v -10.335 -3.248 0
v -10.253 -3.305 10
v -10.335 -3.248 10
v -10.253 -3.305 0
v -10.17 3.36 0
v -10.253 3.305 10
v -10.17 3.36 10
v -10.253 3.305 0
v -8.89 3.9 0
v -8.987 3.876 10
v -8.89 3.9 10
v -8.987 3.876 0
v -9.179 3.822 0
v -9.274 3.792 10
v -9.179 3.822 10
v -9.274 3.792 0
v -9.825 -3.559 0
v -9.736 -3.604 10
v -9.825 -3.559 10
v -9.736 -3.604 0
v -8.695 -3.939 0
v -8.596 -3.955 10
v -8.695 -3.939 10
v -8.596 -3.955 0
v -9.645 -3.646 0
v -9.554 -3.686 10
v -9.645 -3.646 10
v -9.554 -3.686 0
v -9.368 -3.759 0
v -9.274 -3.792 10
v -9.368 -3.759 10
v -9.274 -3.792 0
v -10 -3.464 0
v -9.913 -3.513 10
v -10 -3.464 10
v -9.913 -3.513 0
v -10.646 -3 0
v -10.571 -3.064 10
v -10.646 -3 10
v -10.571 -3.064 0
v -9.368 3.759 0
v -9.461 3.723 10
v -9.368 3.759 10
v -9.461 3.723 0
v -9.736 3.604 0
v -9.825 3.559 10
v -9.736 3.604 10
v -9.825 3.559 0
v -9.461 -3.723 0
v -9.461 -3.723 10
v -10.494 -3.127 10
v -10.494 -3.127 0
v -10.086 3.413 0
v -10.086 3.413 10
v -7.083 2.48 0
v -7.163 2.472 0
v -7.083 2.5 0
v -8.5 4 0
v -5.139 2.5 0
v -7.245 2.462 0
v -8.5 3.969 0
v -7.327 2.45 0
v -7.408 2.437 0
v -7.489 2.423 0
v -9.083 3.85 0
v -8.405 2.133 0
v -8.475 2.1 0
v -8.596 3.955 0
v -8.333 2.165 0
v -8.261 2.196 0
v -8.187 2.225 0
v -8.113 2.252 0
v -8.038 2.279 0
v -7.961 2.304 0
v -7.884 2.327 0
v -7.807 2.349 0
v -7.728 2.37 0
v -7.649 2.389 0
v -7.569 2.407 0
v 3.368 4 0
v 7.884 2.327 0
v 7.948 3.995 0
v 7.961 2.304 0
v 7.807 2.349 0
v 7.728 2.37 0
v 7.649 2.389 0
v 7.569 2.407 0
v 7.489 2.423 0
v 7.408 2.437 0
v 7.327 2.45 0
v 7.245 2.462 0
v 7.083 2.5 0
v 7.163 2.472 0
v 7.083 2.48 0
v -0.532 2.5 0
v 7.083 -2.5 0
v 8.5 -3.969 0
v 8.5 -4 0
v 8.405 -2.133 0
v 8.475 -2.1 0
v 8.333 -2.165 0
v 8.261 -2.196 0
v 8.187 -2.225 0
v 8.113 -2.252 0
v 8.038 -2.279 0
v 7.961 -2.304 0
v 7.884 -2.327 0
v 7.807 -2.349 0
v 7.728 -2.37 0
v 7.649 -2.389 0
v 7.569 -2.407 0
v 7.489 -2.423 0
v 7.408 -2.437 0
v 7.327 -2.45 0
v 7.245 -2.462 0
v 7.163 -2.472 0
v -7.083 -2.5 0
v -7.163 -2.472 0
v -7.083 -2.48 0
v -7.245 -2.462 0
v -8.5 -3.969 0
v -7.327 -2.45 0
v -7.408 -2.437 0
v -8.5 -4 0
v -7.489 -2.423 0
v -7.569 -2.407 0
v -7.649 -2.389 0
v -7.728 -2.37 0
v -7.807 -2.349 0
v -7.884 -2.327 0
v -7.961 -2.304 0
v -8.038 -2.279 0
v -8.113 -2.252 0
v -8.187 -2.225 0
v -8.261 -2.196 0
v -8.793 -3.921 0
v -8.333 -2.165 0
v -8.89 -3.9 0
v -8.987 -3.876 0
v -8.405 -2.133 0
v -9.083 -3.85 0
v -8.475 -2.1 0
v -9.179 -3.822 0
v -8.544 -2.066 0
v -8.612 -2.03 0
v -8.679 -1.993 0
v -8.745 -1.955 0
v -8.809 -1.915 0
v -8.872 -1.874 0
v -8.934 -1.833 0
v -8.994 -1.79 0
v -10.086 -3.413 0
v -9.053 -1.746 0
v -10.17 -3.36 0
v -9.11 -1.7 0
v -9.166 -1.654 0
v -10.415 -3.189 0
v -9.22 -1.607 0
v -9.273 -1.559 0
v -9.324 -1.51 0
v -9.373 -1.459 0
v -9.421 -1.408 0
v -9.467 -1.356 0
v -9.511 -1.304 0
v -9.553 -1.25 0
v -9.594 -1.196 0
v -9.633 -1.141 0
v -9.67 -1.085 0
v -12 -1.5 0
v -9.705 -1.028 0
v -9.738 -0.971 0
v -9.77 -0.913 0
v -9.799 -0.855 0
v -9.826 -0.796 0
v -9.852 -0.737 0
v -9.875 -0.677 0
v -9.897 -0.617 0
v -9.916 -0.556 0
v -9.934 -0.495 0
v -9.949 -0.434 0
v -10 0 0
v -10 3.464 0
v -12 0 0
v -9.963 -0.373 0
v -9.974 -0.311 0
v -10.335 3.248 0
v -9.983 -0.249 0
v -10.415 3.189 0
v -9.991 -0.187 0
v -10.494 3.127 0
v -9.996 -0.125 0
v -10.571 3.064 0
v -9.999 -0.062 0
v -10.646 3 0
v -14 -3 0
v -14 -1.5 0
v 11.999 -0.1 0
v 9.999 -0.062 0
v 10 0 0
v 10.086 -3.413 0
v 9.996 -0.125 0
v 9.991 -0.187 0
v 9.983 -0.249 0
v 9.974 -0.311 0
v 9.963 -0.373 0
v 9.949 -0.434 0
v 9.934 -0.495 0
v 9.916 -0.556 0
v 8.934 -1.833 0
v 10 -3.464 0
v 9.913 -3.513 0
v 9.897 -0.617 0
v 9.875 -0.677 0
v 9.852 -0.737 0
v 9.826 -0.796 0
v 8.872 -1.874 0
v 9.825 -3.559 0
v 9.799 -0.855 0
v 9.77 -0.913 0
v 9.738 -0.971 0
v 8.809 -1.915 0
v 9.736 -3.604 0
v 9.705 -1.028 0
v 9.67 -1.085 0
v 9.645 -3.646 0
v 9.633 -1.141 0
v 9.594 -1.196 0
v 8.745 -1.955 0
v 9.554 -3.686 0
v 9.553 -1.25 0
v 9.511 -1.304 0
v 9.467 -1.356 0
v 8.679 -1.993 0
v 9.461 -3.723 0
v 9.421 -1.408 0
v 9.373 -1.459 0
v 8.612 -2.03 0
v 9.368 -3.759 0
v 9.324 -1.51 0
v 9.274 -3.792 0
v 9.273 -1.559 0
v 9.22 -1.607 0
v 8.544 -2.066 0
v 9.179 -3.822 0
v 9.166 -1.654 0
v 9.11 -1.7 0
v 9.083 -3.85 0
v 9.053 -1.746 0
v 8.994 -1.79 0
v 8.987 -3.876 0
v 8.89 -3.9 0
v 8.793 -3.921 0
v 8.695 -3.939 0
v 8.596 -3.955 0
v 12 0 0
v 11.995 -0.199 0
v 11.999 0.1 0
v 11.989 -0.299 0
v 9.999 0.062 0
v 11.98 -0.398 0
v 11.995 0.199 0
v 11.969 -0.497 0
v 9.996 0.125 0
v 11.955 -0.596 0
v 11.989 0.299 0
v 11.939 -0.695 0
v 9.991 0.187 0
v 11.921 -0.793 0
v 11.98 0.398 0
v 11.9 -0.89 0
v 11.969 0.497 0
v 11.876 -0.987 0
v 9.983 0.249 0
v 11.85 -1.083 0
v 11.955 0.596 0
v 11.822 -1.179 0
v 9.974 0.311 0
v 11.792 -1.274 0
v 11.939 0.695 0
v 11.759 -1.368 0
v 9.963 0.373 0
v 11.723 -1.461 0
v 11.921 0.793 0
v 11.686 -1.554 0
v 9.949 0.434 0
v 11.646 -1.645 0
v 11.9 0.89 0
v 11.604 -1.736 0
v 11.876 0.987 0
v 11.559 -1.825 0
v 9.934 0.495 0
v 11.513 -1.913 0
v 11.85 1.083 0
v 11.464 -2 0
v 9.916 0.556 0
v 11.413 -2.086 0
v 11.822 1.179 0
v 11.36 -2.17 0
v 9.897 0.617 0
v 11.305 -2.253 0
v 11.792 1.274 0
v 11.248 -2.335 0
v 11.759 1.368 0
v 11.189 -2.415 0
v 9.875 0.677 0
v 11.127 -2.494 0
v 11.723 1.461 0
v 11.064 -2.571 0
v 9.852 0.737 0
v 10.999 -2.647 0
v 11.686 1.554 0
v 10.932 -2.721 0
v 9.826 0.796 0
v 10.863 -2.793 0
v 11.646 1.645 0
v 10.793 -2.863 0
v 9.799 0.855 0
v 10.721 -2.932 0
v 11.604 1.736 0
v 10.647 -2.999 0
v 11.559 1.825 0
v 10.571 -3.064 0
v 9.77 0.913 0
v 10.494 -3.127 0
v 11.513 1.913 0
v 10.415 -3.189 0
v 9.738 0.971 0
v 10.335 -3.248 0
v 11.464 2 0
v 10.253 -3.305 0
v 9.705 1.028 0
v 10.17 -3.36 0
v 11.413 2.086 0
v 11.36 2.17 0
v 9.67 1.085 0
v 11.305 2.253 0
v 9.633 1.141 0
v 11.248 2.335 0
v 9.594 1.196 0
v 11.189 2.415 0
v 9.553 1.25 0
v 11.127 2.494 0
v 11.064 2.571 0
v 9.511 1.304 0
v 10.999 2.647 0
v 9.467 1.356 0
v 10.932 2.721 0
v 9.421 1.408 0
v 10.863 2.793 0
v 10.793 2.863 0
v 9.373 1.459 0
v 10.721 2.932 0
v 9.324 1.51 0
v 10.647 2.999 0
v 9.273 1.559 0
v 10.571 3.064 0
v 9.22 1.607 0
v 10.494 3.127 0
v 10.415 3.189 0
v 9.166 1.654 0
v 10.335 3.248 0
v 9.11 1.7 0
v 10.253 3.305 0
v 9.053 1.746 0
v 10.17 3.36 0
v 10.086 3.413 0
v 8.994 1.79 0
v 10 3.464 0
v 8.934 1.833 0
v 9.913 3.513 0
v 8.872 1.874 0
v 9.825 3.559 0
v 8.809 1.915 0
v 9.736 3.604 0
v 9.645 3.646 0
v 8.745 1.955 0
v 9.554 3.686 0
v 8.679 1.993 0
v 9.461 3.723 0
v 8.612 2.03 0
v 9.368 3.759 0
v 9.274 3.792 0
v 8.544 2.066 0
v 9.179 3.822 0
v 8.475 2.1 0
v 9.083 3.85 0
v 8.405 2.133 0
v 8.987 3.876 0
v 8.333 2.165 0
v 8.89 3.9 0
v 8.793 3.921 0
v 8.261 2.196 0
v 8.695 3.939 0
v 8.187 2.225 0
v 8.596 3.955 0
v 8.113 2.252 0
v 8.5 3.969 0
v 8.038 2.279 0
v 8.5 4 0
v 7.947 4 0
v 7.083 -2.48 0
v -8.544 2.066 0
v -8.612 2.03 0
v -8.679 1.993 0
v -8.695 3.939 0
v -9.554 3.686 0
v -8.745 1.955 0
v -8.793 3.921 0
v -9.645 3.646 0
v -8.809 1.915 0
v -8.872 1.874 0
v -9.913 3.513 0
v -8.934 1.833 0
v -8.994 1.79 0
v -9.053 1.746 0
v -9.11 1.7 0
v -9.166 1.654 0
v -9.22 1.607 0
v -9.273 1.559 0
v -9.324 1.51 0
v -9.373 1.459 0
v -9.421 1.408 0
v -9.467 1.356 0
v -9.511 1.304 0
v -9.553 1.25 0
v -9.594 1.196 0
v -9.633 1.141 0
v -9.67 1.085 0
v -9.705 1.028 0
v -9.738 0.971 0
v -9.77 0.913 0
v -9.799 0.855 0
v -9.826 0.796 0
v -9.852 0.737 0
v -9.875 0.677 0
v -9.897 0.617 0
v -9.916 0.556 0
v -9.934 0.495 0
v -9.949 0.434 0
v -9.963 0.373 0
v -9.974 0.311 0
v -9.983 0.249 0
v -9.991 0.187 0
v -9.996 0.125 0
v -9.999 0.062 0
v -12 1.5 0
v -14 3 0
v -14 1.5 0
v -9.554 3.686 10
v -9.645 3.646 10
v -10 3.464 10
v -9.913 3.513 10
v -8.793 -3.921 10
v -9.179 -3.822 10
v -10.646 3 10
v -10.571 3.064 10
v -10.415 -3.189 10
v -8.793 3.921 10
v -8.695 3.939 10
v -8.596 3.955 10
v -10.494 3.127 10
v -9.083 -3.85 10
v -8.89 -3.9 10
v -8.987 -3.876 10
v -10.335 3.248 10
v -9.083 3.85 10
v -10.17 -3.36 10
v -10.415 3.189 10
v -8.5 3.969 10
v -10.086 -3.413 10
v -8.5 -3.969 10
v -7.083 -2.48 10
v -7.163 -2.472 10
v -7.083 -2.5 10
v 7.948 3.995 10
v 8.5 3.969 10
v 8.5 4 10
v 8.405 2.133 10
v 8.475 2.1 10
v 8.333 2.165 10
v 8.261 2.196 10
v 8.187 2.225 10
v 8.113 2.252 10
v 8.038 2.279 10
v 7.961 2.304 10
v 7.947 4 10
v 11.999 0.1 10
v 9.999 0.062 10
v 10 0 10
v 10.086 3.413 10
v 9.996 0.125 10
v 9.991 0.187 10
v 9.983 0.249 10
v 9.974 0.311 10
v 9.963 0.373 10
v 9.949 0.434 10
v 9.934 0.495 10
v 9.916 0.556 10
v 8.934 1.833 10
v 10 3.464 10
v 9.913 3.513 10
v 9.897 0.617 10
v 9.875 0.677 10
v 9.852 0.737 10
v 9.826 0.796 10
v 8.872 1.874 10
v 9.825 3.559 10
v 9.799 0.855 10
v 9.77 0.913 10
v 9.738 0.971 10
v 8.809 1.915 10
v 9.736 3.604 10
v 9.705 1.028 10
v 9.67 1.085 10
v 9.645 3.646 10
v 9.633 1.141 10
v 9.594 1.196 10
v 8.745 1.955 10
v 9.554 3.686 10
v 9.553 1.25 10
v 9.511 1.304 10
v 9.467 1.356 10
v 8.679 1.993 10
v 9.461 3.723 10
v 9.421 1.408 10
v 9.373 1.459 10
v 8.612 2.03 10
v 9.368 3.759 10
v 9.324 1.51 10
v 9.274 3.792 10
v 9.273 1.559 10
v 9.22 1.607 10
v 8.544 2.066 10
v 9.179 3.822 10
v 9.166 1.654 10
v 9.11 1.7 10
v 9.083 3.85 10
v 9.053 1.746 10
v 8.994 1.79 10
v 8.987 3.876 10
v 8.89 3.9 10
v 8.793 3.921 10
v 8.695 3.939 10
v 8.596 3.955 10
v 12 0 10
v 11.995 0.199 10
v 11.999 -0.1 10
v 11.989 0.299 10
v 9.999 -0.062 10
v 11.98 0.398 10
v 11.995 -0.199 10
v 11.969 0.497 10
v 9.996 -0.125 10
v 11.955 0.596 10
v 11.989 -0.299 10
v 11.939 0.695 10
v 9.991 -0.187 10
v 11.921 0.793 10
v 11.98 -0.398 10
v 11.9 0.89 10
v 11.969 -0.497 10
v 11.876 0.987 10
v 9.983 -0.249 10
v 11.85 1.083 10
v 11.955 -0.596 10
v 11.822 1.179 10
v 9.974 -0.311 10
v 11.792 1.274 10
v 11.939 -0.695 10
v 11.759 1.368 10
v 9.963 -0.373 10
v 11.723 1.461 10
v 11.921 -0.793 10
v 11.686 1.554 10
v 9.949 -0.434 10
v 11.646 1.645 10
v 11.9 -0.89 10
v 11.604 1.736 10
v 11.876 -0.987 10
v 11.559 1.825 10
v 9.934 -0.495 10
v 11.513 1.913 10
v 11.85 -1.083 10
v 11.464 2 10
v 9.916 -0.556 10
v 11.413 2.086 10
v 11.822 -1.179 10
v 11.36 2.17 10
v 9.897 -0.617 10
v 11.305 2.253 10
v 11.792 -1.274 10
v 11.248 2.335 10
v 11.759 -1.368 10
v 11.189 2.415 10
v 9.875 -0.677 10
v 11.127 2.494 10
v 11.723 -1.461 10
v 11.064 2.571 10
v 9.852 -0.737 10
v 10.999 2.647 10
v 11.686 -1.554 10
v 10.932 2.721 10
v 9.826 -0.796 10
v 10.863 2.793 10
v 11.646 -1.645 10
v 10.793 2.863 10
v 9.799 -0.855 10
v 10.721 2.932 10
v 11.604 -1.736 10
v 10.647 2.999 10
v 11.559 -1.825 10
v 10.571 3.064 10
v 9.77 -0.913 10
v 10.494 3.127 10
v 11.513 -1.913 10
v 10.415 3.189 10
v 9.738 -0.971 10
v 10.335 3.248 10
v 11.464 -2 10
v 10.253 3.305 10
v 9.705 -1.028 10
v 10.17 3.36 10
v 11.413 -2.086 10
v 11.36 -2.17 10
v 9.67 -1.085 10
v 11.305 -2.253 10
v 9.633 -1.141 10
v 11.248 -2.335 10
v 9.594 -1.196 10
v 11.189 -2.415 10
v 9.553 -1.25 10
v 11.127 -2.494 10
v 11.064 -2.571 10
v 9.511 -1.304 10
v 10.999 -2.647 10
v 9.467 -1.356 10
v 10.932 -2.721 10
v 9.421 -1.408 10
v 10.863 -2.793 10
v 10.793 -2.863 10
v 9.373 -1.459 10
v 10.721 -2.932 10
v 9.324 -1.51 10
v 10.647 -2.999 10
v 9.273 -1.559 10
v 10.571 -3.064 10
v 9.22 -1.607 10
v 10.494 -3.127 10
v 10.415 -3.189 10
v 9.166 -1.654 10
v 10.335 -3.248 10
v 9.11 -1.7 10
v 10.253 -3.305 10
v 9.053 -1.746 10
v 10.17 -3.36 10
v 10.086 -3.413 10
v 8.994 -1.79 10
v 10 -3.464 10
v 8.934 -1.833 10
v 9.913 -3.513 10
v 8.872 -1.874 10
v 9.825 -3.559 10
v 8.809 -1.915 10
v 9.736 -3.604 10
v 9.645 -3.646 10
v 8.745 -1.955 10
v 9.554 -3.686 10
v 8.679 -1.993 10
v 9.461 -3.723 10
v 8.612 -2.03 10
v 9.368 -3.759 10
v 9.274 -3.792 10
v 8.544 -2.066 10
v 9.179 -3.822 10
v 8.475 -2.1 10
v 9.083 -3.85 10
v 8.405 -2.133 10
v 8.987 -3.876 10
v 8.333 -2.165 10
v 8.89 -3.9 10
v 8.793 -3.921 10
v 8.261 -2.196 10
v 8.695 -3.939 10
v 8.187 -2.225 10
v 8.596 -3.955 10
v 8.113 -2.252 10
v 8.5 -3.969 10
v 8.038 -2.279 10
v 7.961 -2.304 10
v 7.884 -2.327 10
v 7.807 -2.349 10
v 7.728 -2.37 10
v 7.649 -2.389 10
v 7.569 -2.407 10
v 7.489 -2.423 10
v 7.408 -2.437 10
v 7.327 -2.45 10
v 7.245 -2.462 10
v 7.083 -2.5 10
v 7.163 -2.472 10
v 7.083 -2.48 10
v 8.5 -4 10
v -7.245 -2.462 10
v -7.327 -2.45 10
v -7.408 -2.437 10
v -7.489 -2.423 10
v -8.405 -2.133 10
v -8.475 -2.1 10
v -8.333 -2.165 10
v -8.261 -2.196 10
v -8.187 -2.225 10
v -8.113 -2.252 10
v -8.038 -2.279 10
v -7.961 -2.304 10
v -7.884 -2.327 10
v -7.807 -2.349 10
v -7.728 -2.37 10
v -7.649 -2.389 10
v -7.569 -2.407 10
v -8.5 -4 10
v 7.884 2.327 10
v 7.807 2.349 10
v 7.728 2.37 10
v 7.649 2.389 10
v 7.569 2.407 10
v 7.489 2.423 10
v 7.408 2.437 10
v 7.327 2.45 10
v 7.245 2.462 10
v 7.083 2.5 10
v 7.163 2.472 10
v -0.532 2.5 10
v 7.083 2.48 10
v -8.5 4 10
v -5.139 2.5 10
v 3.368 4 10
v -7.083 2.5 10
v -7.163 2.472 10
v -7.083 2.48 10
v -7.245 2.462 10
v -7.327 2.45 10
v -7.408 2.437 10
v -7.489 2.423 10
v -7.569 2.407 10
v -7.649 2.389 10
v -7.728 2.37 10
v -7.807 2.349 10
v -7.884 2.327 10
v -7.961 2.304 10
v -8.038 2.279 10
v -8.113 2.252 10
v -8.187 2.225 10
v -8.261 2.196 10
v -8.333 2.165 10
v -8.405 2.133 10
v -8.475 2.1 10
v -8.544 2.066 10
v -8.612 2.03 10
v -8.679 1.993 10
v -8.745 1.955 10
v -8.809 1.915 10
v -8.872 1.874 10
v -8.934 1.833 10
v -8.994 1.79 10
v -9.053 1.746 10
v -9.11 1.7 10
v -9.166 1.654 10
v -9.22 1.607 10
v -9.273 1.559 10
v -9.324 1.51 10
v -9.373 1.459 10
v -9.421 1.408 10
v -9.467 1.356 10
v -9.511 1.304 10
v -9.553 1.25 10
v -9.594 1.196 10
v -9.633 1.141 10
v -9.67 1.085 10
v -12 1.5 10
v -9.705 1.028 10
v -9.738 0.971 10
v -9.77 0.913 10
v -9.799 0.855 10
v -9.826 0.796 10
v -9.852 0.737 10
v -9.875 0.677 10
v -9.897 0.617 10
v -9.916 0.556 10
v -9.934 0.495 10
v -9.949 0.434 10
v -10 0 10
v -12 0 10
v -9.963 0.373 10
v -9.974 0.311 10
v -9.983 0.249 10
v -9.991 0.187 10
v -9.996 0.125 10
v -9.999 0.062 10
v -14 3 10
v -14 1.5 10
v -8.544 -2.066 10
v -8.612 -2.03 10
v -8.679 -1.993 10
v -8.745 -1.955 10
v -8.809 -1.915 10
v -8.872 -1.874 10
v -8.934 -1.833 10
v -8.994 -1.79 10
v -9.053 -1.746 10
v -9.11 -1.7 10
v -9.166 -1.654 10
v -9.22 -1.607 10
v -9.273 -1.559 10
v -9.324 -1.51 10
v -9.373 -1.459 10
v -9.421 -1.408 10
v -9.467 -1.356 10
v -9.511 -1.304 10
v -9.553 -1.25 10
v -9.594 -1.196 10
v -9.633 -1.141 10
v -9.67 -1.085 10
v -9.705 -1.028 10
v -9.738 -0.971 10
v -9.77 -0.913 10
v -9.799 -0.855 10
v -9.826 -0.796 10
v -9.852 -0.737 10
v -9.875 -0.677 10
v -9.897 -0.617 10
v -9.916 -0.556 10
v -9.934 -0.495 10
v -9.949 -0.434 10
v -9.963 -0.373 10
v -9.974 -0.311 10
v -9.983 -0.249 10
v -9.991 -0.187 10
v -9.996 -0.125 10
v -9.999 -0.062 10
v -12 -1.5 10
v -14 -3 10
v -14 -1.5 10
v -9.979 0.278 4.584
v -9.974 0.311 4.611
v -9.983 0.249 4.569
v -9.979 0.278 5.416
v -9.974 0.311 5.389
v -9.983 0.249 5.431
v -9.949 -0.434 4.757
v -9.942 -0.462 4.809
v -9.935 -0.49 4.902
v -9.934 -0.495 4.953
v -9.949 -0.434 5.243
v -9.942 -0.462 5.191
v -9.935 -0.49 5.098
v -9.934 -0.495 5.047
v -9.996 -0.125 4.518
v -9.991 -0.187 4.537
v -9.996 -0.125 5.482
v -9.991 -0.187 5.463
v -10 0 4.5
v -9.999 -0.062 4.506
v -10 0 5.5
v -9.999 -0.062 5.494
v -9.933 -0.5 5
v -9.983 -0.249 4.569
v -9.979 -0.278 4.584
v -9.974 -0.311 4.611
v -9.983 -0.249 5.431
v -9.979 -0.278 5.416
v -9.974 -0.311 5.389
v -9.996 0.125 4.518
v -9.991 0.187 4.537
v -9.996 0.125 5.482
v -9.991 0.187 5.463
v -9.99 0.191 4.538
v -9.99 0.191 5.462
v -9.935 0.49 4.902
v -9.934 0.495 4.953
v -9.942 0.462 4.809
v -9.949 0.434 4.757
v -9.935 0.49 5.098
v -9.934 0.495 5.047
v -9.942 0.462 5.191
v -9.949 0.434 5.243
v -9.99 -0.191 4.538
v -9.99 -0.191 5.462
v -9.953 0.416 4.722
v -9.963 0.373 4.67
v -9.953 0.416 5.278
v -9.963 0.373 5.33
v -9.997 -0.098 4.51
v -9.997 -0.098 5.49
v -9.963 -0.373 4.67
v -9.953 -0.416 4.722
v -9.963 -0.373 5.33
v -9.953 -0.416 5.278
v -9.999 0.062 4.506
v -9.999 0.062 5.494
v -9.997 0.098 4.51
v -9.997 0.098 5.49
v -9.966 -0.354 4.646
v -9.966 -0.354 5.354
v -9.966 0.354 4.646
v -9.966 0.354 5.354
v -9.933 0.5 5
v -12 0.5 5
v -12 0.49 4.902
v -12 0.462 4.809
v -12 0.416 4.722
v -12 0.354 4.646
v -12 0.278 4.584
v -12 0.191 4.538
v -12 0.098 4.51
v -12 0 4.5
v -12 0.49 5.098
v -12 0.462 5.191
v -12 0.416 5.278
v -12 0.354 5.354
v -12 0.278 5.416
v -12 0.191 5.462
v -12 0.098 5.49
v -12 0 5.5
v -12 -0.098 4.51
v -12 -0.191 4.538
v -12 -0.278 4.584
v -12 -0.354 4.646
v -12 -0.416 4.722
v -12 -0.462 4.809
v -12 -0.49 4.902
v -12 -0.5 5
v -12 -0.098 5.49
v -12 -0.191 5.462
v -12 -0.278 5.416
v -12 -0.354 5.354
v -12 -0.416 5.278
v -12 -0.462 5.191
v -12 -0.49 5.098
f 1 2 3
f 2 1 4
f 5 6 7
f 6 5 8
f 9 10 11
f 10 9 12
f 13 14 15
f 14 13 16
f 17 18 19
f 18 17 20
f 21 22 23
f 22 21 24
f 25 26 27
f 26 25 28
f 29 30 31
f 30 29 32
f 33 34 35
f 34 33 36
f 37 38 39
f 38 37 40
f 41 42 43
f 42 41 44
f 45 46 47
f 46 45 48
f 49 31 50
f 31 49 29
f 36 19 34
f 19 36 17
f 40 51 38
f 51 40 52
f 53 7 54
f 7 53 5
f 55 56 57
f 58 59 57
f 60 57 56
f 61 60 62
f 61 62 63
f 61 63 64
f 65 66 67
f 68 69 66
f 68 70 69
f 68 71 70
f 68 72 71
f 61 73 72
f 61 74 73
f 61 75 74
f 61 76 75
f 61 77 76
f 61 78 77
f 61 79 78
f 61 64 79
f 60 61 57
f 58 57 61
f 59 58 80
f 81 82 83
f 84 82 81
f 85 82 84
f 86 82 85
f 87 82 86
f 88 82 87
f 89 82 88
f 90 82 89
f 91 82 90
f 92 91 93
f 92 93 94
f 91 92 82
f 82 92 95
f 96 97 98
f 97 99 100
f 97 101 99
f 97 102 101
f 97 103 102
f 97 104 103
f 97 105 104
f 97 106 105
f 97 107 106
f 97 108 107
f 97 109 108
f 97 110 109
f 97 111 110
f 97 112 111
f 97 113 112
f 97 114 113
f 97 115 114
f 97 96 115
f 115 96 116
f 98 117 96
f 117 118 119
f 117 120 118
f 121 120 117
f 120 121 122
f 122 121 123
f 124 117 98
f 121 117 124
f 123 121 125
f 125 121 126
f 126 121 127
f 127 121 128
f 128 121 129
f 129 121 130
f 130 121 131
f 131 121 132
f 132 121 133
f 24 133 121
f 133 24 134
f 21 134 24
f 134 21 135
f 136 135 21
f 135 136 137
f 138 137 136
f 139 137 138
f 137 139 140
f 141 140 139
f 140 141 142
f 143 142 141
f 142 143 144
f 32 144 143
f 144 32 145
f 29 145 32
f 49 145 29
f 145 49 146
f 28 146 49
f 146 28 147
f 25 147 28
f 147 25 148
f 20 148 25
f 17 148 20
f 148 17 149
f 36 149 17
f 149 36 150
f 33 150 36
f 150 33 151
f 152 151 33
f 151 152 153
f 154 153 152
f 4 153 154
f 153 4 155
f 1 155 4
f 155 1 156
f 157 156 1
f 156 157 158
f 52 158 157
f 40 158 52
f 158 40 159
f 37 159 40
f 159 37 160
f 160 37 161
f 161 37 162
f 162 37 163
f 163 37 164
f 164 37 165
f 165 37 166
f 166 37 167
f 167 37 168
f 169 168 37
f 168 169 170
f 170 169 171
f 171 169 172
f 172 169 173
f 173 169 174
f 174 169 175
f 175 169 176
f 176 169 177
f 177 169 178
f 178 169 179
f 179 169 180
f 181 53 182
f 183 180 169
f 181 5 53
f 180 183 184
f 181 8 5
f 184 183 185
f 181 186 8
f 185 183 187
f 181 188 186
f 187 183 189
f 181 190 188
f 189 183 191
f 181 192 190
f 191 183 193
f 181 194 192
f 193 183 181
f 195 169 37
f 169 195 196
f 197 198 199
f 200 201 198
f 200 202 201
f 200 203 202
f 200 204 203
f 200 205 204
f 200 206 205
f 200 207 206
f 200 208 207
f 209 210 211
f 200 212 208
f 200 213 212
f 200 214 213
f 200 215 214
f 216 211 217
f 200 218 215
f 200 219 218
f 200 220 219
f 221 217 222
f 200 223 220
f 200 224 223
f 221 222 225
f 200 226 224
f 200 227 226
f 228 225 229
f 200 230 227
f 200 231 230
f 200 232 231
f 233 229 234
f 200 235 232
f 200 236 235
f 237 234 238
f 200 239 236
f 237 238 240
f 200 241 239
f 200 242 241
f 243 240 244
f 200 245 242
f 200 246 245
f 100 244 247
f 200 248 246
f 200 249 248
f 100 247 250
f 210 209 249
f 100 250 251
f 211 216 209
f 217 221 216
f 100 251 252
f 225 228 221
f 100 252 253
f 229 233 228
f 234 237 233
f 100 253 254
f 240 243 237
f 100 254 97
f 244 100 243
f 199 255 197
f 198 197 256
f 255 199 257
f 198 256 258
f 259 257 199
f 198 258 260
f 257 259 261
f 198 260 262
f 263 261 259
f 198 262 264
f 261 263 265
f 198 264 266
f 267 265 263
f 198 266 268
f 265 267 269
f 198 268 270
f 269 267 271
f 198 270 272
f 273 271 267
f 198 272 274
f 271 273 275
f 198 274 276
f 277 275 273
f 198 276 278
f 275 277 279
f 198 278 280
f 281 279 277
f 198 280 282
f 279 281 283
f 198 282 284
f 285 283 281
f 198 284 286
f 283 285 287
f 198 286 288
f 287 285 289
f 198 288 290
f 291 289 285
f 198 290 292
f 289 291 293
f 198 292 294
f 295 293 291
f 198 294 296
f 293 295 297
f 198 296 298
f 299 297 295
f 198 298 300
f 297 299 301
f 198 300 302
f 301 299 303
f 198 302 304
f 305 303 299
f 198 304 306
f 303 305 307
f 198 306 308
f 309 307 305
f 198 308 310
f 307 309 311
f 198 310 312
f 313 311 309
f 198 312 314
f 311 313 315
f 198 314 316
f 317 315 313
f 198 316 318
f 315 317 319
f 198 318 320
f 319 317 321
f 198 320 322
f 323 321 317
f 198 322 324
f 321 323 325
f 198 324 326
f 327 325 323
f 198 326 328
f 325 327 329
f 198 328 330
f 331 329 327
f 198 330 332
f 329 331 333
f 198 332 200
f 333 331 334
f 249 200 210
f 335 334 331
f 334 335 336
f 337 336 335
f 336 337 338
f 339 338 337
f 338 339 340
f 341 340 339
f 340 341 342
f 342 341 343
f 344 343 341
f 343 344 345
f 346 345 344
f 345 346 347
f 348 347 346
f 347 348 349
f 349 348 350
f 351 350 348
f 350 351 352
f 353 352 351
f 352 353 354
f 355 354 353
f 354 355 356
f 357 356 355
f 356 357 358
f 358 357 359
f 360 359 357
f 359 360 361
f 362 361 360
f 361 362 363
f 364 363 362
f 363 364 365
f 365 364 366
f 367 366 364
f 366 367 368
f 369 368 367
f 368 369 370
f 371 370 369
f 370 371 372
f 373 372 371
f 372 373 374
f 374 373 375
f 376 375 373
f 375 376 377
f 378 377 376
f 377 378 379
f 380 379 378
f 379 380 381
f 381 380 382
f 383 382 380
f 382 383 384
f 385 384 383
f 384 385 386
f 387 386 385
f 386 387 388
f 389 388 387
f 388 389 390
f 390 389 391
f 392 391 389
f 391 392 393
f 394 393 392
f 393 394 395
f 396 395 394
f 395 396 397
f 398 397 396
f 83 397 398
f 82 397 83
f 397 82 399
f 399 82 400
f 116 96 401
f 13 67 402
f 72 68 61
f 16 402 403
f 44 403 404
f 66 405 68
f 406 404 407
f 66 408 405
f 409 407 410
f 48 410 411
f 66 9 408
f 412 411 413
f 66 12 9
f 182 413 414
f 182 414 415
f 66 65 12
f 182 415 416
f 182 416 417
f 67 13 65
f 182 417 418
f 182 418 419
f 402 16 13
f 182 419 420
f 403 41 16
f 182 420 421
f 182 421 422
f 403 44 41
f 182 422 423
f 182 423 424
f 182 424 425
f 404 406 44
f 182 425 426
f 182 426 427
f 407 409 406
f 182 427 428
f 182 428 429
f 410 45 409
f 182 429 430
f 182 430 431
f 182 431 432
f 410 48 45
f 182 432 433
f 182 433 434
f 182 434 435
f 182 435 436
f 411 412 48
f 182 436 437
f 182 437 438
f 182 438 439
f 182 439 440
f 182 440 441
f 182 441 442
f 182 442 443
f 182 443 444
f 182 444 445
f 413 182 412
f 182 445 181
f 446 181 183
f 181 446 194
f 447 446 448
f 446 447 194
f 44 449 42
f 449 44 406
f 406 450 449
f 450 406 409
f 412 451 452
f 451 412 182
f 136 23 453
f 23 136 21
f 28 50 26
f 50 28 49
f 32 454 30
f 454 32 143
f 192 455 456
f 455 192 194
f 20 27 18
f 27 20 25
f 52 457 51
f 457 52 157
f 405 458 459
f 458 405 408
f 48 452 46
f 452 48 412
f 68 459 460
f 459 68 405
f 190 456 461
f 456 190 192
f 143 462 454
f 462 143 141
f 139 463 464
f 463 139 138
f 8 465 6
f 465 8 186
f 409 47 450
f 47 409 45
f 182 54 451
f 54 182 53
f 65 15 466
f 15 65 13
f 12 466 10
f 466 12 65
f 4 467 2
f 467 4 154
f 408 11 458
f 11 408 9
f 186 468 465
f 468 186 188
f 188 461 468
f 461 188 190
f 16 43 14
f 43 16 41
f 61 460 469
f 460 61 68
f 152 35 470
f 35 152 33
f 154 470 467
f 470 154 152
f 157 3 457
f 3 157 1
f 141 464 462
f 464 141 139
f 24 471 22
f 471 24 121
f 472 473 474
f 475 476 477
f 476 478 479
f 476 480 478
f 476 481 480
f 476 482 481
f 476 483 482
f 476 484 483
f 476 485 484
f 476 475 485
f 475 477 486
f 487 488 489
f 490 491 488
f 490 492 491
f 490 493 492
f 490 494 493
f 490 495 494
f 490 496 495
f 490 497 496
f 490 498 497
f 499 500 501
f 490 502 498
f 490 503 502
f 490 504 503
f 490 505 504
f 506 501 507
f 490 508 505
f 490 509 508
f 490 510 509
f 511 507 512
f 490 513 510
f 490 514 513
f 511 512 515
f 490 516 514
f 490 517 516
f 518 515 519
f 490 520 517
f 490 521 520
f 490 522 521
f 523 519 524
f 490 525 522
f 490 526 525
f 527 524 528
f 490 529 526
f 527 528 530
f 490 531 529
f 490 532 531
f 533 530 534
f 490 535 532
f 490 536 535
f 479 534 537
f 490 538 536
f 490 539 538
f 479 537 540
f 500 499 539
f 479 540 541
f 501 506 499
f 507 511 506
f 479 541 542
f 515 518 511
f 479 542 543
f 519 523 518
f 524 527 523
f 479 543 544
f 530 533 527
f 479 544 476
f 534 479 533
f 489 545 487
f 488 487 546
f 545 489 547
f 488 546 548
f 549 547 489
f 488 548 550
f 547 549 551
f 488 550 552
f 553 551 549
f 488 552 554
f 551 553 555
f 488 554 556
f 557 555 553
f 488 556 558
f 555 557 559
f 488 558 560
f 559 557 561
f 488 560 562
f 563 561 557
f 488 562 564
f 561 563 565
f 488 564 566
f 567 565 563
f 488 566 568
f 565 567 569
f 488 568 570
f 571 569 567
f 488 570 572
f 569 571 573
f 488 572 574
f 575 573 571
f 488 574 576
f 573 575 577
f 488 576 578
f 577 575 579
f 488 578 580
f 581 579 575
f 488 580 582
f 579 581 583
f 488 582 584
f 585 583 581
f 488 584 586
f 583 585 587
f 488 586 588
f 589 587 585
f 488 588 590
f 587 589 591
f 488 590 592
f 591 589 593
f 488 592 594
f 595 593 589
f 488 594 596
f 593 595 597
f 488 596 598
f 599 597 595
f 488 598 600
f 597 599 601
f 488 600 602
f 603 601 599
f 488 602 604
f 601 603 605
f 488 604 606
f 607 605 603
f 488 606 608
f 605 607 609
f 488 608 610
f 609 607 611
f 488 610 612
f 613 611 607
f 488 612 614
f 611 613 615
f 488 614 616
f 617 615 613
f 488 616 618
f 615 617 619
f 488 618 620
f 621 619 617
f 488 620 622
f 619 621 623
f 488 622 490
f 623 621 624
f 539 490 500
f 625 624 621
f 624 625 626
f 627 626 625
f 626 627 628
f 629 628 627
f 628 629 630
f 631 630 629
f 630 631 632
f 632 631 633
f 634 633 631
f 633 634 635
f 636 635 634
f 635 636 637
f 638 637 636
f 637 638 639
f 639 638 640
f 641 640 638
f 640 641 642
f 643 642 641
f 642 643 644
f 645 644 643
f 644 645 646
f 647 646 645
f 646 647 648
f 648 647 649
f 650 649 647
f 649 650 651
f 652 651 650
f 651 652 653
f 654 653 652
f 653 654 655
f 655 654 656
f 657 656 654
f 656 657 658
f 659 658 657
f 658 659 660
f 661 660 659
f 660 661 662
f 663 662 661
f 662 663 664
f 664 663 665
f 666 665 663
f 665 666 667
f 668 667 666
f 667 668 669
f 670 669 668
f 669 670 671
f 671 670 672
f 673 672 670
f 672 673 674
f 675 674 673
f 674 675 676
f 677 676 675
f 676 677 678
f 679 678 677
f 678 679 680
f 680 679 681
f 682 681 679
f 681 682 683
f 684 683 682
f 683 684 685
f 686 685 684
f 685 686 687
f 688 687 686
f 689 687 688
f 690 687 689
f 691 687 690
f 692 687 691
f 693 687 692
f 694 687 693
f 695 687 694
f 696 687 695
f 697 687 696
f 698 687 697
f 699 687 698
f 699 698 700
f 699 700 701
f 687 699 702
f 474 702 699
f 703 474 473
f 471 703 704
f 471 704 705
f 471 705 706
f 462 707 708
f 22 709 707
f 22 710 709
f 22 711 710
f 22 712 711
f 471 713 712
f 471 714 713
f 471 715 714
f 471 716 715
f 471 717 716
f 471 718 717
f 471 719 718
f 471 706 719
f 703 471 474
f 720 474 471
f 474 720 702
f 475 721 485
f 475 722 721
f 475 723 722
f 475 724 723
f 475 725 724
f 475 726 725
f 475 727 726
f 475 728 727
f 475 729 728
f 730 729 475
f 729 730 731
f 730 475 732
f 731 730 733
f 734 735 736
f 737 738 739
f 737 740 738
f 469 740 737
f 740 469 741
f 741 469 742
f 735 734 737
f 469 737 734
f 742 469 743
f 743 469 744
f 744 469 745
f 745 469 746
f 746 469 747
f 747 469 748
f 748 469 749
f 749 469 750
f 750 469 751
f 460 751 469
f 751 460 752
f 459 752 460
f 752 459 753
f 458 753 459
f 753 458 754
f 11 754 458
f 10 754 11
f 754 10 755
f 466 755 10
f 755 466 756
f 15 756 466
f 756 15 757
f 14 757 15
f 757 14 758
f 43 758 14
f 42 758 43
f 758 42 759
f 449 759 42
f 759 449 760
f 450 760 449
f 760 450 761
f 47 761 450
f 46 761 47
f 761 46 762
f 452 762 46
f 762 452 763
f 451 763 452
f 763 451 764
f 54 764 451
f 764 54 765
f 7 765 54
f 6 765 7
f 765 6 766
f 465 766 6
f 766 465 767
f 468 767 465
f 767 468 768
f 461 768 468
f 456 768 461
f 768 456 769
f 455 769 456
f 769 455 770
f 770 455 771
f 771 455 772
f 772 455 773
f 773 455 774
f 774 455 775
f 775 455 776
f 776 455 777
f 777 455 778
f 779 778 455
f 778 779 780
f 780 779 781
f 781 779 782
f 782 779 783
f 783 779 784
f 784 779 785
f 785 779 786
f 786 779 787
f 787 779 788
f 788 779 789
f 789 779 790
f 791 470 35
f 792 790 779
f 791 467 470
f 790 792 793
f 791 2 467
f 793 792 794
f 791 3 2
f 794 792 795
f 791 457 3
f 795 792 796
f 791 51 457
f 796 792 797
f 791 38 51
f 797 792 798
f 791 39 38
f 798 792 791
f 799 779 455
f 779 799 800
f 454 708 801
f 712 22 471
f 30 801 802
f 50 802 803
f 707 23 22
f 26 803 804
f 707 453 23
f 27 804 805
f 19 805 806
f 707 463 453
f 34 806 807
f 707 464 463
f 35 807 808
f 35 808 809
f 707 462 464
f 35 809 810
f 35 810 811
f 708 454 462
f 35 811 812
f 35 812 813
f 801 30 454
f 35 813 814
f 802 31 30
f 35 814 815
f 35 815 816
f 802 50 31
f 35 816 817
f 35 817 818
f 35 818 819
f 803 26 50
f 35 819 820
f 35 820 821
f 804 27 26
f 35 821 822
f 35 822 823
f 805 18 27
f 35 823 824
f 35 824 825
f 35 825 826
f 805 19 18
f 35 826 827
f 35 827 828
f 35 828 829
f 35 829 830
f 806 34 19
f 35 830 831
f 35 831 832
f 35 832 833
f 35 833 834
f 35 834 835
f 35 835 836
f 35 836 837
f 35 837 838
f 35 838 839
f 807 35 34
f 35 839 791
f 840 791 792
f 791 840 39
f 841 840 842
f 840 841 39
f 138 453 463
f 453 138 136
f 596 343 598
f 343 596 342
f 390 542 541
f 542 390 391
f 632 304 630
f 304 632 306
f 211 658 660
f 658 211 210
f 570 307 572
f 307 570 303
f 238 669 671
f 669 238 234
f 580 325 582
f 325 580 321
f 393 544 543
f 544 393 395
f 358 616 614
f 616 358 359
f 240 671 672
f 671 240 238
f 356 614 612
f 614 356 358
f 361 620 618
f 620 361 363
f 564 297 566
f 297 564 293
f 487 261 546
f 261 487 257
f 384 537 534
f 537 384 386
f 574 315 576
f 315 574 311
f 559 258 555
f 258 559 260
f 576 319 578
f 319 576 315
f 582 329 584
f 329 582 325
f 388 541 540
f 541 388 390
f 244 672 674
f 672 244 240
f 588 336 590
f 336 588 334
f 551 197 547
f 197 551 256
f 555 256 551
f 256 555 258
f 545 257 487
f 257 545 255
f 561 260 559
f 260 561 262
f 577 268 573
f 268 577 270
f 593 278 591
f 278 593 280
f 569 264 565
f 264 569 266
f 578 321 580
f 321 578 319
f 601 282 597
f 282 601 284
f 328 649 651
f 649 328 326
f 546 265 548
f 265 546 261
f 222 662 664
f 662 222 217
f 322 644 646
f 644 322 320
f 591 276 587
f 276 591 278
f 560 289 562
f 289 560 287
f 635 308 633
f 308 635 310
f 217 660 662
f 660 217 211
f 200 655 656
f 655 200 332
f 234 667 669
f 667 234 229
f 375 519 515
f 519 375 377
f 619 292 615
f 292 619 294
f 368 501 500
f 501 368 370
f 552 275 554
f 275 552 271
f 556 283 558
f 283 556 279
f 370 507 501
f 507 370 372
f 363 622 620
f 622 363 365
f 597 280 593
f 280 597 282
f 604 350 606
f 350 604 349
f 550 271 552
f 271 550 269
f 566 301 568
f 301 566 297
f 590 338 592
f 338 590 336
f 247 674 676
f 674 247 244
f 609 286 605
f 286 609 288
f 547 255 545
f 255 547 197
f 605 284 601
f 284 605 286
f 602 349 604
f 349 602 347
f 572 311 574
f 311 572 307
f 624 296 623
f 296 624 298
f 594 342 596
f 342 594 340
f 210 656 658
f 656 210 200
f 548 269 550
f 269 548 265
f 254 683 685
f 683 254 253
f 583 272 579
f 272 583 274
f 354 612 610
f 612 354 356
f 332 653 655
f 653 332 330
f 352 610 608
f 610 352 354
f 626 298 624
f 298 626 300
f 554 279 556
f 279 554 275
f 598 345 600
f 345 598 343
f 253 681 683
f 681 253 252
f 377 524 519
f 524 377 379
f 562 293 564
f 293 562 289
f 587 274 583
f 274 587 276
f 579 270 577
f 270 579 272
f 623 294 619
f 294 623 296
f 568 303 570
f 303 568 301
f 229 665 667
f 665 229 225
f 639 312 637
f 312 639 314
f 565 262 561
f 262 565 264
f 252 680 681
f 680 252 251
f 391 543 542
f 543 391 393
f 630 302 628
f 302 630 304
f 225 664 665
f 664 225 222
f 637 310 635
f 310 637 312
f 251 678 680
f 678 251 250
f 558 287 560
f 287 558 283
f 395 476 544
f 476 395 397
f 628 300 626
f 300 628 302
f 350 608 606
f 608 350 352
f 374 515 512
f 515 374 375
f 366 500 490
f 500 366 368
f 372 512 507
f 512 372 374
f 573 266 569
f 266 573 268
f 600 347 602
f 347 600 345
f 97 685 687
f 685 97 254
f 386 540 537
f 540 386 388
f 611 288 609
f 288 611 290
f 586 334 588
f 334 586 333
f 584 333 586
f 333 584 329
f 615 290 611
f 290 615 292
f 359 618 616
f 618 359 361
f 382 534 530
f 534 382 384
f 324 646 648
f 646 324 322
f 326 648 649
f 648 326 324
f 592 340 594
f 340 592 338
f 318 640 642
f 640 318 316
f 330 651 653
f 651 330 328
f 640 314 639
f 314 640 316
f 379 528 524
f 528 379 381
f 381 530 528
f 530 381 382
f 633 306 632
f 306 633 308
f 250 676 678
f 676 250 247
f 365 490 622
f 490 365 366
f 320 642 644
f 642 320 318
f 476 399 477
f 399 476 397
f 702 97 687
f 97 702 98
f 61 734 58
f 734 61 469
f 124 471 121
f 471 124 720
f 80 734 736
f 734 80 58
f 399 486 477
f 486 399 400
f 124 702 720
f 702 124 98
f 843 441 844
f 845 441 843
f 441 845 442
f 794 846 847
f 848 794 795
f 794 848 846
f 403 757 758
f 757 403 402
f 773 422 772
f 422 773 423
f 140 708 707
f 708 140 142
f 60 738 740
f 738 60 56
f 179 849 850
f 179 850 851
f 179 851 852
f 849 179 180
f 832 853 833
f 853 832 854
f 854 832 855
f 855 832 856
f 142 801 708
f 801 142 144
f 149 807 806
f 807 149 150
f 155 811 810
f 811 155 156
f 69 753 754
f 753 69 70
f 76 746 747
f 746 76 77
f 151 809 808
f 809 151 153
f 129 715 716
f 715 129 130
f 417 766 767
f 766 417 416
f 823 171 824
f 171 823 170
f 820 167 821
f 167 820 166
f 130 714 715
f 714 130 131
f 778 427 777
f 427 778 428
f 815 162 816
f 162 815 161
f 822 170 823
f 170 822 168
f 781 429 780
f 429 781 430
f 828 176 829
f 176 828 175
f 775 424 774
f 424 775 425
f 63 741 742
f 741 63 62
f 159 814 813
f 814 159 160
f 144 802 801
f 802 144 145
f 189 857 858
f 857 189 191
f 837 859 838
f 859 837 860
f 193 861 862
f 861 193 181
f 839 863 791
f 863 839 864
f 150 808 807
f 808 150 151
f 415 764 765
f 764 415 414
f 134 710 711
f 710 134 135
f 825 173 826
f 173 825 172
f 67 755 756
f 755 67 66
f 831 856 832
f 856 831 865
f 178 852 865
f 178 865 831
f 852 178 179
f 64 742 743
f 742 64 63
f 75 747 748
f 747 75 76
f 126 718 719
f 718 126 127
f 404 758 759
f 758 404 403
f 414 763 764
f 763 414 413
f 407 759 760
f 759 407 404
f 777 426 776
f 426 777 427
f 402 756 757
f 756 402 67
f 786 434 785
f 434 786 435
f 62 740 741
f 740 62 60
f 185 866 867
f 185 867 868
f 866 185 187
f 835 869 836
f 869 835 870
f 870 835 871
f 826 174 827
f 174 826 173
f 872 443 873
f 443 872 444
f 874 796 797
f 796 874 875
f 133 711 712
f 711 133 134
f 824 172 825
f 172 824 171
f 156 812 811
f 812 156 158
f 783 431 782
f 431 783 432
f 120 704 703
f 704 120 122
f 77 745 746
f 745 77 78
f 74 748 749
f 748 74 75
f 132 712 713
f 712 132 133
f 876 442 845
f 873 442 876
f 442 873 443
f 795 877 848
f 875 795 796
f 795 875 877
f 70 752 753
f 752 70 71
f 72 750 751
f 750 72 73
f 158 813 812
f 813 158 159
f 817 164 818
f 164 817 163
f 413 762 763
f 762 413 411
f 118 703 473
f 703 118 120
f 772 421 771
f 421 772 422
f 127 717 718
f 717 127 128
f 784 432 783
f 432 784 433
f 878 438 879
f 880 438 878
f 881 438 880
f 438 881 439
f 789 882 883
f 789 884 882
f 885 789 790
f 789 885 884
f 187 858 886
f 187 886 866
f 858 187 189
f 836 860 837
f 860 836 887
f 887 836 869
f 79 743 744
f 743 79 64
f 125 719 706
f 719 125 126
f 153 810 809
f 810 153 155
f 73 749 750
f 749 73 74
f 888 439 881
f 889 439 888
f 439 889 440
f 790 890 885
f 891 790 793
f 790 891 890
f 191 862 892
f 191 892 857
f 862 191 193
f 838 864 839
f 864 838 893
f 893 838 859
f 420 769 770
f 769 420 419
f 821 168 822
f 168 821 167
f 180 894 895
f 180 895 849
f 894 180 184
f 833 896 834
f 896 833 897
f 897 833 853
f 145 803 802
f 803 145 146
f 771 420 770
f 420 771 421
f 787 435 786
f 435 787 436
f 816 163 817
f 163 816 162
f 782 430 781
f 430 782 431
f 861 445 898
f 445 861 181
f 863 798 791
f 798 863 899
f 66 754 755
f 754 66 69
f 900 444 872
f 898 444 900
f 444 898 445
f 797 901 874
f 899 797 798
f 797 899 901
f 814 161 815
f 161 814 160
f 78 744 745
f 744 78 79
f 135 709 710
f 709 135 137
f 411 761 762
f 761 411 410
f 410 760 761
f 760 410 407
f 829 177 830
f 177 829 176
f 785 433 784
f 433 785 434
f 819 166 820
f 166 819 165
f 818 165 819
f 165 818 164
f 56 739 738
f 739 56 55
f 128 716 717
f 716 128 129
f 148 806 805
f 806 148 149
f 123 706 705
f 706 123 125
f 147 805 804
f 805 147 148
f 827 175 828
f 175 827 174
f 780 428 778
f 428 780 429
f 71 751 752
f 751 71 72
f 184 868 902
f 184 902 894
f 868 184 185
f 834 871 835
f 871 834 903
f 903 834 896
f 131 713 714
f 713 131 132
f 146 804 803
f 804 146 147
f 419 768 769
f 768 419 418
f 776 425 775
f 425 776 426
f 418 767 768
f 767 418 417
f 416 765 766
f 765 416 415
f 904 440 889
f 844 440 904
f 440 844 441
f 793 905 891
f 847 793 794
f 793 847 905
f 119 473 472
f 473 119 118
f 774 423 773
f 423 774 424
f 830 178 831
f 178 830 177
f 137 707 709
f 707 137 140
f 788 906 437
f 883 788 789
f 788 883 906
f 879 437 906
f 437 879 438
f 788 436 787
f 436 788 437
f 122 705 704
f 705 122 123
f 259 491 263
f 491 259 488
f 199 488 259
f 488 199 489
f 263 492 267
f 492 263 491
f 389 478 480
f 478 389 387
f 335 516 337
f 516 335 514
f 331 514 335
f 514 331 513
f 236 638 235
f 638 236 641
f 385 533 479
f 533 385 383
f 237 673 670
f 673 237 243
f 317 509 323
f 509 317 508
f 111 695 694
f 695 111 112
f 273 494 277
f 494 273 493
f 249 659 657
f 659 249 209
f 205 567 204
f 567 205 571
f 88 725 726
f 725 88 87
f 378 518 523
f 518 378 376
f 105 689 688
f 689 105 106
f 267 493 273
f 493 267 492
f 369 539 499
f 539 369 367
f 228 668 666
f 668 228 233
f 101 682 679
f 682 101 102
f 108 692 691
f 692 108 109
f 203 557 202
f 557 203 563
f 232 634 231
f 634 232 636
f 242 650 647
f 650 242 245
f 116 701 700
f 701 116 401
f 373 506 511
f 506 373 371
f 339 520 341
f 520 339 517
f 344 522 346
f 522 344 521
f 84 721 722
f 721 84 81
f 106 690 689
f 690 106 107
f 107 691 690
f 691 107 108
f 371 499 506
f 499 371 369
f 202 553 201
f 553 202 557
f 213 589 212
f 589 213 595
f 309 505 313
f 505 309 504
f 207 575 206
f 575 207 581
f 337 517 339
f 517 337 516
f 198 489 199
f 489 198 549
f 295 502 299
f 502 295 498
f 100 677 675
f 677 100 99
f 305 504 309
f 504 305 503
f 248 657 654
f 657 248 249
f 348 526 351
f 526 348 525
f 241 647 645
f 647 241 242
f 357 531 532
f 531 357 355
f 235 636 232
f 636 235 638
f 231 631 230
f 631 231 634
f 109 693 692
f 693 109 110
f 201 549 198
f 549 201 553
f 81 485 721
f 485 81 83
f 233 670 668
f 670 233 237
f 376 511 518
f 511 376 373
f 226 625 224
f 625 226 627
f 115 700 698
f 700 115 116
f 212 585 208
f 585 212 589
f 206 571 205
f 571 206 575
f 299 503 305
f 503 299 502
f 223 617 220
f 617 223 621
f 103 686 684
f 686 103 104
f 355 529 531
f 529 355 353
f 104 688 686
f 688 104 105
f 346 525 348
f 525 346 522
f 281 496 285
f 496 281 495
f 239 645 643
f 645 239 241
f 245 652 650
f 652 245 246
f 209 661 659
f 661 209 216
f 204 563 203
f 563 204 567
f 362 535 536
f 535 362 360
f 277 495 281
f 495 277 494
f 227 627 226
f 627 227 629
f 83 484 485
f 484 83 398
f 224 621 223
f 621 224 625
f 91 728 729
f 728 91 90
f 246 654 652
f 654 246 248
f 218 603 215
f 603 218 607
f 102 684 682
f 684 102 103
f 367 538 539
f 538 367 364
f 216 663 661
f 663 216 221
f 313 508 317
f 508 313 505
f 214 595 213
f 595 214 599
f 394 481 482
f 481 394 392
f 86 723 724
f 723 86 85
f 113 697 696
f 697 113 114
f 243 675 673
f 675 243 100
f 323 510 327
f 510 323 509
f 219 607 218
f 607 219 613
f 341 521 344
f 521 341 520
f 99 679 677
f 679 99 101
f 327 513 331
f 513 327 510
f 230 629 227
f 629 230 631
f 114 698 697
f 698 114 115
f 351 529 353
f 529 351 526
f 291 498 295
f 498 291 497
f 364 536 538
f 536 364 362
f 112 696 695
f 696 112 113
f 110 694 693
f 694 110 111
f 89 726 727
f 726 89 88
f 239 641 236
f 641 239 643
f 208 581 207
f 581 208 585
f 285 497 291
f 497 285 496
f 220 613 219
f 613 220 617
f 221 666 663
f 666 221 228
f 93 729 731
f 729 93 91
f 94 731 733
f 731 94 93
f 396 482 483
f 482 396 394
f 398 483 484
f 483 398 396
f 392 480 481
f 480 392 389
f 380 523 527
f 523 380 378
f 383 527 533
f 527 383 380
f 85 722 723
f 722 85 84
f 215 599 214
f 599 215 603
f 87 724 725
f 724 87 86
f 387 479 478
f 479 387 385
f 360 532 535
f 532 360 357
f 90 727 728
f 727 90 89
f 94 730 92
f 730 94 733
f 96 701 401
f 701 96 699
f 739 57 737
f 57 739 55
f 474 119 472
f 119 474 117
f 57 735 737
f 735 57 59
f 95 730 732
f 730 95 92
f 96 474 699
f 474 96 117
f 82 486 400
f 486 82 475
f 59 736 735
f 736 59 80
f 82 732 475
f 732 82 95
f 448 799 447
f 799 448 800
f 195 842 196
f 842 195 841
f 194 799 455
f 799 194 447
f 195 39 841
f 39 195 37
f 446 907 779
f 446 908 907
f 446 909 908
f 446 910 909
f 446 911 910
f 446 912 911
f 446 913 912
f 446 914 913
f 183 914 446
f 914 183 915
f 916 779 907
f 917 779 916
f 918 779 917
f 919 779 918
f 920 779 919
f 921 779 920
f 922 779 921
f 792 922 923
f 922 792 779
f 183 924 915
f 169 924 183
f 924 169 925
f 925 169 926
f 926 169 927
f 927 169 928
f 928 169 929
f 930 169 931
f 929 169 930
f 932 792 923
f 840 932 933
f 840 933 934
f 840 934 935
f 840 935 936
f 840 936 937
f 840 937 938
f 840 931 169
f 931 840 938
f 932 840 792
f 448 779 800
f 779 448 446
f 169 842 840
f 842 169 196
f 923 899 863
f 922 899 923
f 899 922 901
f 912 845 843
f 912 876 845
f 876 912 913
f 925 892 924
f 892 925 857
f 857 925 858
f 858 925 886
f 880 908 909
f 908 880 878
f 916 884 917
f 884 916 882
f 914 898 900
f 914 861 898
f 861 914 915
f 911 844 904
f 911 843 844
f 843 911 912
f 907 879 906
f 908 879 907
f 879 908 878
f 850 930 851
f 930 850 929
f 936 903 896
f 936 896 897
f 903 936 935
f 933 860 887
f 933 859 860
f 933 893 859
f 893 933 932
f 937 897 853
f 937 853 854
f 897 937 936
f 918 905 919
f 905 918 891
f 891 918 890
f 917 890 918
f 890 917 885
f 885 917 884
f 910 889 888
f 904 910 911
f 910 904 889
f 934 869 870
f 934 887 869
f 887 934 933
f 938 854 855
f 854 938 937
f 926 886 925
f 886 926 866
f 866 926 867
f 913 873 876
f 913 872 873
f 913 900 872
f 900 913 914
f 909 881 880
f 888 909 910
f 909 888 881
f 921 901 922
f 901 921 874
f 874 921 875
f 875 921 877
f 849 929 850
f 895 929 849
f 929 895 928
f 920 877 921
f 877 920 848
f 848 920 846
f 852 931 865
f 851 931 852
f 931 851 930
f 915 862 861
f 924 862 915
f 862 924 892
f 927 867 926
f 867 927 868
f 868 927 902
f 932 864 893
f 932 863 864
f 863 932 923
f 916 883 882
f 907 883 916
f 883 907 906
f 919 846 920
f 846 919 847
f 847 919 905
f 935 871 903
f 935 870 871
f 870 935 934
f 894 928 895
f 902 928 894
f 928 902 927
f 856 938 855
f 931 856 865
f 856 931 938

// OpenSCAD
$fs = 0.1;  // Don't generate smaller facets than 0.1 mm
$fa = 1;    // Don't generate larger angles than 1 degrees

module oval() {
    translate([-8,0,0])
        cylinder(h=10, r=4);
    translate([8,0,0])
        cylinder(h=10, r=4);
    translate([0,0,5])
        cube([17, 8, 10], center=true);
}

module main() {
    difference() {
        oval();
        translate([0,0,-1])
            resize([20,5,12]) 
                oval();
        translate([0,3,5])
            rotate(10) 
                cube([16,0.8,12], center=true);
    }
}

module base() {
    difference() {    
        translate([-12, 0, 5])
            cube([4,6,10], center=true);
        translate([-14, 0, 5])
            cube([4, 3, 12], center=true);
    }
}

module clip() {
    union() {
        main();
        base();
    }
}

difference() {
    clip();
    translate([-15, 0, 5])
        rotate([0,90,0])
            cylinder(h=6, r=0.5);

}
